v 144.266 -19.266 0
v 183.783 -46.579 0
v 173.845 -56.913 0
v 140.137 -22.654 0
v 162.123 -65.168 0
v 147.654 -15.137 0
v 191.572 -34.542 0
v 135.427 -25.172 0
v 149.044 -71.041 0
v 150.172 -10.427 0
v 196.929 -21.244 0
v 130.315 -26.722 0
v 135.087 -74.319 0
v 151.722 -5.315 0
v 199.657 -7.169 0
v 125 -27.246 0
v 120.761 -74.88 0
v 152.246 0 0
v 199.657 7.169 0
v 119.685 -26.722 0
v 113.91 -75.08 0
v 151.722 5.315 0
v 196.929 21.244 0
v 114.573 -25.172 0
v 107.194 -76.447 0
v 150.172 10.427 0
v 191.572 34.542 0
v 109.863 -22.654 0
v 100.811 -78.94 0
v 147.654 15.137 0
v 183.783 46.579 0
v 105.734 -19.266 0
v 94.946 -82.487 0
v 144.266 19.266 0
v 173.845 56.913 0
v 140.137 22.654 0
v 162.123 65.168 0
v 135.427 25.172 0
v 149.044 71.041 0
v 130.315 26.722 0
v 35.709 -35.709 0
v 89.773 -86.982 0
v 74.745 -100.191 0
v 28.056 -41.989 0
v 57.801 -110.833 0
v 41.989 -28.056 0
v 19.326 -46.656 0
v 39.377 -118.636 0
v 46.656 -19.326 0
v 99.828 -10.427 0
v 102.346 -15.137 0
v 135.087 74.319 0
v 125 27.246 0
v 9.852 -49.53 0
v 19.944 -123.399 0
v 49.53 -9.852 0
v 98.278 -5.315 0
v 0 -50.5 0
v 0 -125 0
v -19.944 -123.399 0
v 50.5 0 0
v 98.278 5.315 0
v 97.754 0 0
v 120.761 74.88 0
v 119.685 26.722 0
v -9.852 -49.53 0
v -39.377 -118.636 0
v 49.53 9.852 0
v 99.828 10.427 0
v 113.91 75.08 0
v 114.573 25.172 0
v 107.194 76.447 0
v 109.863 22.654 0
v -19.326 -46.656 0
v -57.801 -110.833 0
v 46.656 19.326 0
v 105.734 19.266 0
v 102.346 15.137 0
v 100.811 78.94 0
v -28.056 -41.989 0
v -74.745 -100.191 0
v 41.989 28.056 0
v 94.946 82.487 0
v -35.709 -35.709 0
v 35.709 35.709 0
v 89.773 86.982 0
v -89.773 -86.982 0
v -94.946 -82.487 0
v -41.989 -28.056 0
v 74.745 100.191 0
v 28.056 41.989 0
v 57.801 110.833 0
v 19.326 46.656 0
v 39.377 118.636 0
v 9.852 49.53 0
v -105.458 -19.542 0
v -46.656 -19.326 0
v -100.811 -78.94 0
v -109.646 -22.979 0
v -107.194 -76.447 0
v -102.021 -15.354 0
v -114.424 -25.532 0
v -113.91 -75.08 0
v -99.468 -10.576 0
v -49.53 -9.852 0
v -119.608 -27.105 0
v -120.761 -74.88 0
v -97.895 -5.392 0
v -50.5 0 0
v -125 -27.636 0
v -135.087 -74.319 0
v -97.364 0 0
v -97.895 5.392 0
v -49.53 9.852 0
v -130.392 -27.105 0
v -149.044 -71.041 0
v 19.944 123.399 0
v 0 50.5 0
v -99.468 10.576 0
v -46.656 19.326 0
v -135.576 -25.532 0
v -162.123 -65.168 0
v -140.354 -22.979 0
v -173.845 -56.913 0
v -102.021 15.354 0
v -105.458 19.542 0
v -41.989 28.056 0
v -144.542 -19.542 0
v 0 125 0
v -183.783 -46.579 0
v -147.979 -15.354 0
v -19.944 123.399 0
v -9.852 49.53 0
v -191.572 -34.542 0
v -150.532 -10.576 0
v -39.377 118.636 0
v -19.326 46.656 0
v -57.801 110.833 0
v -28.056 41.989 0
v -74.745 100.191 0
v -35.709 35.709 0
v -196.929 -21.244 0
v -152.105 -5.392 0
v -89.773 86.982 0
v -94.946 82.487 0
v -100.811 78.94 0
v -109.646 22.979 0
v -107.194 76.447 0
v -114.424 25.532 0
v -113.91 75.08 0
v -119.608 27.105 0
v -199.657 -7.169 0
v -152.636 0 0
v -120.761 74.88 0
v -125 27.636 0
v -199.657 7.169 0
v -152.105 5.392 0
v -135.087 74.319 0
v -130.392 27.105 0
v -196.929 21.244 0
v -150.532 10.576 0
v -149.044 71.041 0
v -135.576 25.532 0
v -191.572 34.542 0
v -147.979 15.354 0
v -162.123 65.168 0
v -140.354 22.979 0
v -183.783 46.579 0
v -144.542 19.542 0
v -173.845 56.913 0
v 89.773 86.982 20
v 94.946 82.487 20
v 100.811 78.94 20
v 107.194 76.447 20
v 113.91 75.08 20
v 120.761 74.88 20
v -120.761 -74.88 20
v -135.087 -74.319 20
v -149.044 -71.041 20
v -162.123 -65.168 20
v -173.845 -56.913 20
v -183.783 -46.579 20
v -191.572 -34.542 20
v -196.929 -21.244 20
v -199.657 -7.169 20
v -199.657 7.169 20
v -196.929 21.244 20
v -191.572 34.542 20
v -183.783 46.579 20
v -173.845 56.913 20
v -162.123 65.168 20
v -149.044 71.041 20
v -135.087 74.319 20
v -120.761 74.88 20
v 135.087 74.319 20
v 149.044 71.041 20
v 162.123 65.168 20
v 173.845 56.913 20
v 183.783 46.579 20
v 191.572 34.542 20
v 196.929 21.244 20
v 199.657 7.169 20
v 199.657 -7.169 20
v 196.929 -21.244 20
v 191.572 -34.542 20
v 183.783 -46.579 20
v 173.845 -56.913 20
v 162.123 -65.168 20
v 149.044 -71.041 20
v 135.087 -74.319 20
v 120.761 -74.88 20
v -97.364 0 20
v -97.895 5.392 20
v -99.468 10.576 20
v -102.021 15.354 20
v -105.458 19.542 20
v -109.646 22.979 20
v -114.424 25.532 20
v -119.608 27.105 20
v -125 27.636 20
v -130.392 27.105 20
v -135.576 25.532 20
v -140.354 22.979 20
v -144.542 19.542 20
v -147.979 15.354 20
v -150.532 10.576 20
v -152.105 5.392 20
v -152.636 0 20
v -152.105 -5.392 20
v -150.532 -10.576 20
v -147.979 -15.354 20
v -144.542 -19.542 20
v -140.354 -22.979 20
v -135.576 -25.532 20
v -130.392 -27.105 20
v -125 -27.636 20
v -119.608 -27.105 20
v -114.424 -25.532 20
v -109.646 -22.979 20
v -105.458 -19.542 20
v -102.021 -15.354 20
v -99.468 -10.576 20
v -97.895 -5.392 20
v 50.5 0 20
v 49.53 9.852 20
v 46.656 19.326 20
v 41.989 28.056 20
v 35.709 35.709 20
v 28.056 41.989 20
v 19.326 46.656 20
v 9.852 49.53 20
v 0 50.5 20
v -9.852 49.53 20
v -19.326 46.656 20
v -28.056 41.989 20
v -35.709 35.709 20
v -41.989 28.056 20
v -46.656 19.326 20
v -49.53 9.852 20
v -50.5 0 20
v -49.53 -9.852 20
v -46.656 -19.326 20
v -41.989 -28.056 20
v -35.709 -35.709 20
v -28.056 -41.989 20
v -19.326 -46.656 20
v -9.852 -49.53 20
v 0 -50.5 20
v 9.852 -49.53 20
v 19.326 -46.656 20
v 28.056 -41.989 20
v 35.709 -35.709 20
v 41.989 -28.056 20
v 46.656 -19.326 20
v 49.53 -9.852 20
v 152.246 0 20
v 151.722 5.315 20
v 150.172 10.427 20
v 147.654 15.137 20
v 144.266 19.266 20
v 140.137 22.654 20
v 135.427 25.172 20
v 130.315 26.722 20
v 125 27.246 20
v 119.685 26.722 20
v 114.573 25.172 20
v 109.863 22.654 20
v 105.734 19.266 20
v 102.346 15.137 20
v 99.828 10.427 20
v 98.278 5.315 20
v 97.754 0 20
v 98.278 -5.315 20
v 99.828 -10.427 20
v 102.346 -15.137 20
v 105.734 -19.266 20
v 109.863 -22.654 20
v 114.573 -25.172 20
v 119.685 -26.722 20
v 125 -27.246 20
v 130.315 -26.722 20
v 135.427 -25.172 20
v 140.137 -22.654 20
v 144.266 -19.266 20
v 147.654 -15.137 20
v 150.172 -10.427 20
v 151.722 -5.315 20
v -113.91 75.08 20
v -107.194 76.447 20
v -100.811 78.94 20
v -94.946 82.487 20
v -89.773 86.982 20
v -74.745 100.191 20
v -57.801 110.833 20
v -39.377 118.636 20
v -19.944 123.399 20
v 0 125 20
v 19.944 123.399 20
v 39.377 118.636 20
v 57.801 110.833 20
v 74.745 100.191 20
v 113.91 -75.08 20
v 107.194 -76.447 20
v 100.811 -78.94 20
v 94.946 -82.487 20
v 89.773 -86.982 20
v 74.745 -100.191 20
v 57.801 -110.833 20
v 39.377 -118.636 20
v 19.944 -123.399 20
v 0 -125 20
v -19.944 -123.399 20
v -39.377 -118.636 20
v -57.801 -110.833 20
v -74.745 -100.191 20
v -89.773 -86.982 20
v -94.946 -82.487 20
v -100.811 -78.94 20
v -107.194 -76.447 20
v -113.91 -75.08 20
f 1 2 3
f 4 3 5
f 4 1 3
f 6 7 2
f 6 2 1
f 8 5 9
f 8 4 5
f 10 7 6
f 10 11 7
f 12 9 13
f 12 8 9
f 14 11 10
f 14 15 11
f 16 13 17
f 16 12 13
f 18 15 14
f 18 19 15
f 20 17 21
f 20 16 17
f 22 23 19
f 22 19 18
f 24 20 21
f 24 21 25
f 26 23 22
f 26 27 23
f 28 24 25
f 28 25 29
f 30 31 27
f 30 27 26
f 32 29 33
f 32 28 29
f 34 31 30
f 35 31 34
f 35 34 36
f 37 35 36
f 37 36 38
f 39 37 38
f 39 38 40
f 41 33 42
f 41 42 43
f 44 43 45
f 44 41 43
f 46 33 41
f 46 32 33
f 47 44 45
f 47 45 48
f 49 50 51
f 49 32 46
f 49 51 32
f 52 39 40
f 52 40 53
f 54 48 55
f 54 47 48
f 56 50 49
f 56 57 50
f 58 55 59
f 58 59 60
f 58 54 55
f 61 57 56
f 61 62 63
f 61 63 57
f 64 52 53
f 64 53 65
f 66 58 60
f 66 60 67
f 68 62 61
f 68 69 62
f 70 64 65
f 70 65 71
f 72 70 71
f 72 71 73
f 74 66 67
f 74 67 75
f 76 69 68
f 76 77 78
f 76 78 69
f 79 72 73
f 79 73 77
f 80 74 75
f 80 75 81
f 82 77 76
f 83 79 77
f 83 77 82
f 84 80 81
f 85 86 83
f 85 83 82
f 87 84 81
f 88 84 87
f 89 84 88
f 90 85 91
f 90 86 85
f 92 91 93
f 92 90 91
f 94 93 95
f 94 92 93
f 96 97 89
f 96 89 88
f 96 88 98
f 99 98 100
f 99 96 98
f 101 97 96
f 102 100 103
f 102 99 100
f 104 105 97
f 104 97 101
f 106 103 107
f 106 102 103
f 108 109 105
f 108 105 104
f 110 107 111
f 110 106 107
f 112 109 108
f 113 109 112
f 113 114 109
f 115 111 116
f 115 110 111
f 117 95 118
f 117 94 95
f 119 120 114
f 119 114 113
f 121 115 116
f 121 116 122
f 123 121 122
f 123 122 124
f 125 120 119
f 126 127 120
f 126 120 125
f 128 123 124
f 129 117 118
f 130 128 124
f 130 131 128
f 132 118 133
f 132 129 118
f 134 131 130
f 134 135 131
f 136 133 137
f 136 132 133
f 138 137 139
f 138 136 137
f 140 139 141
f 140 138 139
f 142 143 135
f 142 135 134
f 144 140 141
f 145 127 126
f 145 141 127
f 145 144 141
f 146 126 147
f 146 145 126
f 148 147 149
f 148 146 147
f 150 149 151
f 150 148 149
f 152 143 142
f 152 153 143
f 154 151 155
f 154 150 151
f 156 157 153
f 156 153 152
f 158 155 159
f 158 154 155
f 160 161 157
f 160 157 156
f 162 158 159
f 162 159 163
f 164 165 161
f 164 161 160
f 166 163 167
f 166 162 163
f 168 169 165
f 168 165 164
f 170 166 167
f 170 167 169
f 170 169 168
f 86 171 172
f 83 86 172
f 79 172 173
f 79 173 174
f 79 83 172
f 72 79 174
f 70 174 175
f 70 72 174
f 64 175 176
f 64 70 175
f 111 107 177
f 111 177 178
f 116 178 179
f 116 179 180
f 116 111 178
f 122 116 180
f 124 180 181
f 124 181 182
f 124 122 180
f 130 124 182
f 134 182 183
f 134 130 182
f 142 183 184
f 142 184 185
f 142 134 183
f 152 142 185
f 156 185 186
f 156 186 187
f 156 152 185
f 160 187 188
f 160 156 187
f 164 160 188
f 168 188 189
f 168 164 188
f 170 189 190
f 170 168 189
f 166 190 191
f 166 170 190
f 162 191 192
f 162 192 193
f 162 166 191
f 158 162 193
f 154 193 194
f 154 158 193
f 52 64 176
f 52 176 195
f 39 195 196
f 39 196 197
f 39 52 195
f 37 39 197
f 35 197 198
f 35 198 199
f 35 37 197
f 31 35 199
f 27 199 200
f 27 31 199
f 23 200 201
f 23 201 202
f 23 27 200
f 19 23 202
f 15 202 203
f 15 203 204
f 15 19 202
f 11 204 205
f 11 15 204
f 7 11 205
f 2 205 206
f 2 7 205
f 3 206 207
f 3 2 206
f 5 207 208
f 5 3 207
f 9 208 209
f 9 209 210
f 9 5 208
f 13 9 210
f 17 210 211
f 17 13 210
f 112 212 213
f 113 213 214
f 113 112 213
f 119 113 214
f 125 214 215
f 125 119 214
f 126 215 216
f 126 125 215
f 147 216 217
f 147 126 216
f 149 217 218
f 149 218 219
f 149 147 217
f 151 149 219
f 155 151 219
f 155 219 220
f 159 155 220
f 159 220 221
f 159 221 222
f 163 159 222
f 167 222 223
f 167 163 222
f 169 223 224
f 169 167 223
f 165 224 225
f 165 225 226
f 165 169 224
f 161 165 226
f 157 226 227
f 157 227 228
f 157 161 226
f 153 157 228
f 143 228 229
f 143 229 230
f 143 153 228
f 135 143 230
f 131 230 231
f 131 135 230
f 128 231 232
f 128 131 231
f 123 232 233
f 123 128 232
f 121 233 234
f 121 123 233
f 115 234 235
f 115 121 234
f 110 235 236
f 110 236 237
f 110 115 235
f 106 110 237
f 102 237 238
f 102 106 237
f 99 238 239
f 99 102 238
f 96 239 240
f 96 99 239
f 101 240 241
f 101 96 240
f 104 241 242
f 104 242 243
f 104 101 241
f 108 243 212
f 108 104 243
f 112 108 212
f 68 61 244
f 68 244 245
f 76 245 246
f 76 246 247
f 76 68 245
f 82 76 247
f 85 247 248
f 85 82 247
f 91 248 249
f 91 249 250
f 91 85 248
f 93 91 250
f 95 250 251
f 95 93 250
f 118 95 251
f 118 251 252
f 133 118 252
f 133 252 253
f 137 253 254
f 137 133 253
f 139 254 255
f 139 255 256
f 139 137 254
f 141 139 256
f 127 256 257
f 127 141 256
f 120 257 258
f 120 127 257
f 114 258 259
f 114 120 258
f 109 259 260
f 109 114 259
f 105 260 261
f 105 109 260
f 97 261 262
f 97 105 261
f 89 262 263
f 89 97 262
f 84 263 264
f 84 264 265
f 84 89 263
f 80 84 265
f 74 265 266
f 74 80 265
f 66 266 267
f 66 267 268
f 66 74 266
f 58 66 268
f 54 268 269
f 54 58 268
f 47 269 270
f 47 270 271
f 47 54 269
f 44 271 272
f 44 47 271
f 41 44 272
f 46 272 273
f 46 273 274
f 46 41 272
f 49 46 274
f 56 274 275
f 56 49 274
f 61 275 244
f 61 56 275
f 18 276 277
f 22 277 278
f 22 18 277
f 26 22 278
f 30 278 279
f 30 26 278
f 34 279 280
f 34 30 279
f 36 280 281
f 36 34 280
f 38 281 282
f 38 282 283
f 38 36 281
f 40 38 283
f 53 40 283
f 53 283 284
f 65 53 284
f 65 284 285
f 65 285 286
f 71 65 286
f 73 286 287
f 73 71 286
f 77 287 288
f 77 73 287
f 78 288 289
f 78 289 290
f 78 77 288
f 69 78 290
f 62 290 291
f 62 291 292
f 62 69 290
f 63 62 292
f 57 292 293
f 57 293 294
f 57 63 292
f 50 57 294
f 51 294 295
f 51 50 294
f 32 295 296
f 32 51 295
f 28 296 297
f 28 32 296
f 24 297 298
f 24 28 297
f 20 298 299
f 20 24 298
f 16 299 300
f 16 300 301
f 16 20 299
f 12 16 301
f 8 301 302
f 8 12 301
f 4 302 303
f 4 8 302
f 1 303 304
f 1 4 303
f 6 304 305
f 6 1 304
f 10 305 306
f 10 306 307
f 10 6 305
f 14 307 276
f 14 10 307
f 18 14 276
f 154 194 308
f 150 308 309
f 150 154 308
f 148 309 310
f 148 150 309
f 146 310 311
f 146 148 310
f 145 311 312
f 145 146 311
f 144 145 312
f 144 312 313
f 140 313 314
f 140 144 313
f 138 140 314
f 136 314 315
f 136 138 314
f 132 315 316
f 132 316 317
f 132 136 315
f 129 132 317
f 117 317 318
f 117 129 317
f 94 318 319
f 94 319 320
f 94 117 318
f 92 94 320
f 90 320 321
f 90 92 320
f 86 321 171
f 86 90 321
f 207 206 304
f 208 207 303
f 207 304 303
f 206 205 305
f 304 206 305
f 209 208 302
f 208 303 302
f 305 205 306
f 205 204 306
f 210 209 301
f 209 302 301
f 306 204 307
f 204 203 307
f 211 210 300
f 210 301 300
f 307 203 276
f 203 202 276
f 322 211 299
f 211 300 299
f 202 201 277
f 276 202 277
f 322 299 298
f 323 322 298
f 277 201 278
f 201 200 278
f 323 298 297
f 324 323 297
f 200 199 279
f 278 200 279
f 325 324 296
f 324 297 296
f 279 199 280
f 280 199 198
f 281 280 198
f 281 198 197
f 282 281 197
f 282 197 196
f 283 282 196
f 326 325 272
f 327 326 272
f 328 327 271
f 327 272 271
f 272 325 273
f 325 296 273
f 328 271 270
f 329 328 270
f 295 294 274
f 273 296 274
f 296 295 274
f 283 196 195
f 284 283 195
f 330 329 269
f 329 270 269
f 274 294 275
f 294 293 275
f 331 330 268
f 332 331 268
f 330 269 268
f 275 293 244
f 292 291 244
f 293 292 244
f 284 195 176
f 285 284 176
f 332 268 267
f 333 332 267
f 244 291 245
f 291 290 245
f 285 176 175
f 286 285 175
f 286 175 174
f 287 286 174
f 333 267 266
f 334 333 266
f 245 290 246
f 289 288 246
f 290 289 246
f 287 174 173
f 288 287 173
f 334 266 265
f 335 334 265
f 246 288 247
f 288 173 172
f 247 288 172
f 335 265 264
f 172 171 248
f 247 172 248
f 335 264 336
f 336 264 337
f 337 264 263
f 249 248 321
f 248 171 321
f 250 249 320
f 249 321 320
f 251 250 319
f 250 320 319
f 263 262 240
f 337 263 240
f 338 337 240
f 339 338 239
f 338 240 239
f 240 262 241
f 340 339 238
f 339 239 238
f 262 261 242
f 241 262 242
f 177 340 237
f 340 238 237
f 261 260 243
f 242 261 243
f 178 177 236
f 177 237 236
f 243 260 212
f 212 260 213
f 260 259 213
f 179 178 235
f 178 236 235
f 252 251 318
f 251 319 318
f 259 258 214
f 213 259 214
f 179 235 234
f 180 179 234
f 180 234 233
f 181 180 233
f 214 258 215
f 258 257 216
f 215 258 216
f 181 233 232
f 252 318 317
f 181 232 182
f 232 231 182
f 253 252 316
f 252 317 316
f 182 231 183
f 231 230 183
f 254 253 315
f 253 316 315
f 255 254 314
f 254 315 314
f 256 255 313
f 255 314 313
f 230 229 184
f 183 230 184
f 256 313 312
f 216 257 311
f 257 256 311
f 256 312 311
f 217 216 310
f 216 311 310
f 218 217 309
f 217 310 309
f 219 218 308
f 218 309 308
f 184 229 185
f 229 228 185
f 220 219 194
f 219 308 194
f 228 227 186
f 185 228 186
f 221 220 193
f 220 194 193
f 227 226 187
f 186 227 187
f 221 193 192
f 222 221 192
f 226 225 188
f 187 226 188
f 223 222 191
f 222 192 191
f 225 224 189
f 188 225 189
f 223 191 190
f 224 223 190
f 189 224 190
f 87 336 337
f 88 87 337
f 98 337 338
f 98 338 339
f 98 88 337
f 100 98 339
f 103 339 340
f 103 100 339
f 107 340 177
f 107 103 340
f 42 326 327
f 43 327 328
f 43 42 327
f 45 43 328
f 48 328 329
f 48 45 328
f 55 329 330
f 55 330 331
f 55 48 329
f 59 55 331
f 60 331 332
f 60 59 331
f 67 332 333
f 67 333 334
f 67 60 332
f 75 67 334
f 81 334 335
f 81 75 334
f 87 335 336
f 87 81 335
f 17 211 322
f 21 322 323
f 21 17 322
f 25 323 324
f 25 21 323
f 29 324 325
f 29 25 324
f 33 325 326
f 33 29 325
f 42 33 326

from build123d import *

# Parameters (mm, degrees)
SZKIC1_R                    = 27.245803964
SZKIC1_R_2                  = 27.636152319
SZKIC1_R_3                  = 50.5
DODANIE_WYCI_GNI_CIE1_DEPTH = 20


with BuildPart() as part:
    # Szkic1 → Dodanie-wyciągnięcie1 (new body)
    with BuildSketch(Plane.XY):
        with BuildLine():
            ThreePointArc((-120.760869565, 74.880102652), (-103.94901291, 77.556678408), (-89.772727273, 86.981937424))
            ThreePointArc((-89.772727273, 86.981937424), (0, 125), (89.772727273, 86.981937424))
            ThreePointArc((89.772727273, 86.981937424), (103.94901291, 77.556678408), (120.760869565, 74.880102652))
            ThreePointArc((120.760869565, 74.880102652), (200, 0), (120.760869565, -74.880102652))
            ThreePointArc((120.760869565, -74.880102652), (103.94901291, -77.556678408), (89.772727273, -86.981937424))
            ThreePointArc((89.772727273, -86.981937424), (0, -125), (-89.772727273, -86.981937424))
            ThreePointArc((-89.772727273, -86.981937424), (-103.94901291, -77.556678408), (-120.760869565, -74.880102652))
            ThreePointArc((-120.760869565, -74.880102652), (-200, 0), (-120.760869565, 74.880102652))
        make_face()
        with Locations((125, 0)):
            Circle(SZKIC1_R, mode=Mode.SUBTRACT)
        with Locations((-125, 0)):
            Circle(SZKIC1_R_2, mode=Mode.SUBTRACT)
        Circle(SZKIC1_R_3, mode=Mode.SUBTRACT)
    extrude(amount=DODANIE_WYCI_GNI_CIE1_DEPTH)


solid = part.part
